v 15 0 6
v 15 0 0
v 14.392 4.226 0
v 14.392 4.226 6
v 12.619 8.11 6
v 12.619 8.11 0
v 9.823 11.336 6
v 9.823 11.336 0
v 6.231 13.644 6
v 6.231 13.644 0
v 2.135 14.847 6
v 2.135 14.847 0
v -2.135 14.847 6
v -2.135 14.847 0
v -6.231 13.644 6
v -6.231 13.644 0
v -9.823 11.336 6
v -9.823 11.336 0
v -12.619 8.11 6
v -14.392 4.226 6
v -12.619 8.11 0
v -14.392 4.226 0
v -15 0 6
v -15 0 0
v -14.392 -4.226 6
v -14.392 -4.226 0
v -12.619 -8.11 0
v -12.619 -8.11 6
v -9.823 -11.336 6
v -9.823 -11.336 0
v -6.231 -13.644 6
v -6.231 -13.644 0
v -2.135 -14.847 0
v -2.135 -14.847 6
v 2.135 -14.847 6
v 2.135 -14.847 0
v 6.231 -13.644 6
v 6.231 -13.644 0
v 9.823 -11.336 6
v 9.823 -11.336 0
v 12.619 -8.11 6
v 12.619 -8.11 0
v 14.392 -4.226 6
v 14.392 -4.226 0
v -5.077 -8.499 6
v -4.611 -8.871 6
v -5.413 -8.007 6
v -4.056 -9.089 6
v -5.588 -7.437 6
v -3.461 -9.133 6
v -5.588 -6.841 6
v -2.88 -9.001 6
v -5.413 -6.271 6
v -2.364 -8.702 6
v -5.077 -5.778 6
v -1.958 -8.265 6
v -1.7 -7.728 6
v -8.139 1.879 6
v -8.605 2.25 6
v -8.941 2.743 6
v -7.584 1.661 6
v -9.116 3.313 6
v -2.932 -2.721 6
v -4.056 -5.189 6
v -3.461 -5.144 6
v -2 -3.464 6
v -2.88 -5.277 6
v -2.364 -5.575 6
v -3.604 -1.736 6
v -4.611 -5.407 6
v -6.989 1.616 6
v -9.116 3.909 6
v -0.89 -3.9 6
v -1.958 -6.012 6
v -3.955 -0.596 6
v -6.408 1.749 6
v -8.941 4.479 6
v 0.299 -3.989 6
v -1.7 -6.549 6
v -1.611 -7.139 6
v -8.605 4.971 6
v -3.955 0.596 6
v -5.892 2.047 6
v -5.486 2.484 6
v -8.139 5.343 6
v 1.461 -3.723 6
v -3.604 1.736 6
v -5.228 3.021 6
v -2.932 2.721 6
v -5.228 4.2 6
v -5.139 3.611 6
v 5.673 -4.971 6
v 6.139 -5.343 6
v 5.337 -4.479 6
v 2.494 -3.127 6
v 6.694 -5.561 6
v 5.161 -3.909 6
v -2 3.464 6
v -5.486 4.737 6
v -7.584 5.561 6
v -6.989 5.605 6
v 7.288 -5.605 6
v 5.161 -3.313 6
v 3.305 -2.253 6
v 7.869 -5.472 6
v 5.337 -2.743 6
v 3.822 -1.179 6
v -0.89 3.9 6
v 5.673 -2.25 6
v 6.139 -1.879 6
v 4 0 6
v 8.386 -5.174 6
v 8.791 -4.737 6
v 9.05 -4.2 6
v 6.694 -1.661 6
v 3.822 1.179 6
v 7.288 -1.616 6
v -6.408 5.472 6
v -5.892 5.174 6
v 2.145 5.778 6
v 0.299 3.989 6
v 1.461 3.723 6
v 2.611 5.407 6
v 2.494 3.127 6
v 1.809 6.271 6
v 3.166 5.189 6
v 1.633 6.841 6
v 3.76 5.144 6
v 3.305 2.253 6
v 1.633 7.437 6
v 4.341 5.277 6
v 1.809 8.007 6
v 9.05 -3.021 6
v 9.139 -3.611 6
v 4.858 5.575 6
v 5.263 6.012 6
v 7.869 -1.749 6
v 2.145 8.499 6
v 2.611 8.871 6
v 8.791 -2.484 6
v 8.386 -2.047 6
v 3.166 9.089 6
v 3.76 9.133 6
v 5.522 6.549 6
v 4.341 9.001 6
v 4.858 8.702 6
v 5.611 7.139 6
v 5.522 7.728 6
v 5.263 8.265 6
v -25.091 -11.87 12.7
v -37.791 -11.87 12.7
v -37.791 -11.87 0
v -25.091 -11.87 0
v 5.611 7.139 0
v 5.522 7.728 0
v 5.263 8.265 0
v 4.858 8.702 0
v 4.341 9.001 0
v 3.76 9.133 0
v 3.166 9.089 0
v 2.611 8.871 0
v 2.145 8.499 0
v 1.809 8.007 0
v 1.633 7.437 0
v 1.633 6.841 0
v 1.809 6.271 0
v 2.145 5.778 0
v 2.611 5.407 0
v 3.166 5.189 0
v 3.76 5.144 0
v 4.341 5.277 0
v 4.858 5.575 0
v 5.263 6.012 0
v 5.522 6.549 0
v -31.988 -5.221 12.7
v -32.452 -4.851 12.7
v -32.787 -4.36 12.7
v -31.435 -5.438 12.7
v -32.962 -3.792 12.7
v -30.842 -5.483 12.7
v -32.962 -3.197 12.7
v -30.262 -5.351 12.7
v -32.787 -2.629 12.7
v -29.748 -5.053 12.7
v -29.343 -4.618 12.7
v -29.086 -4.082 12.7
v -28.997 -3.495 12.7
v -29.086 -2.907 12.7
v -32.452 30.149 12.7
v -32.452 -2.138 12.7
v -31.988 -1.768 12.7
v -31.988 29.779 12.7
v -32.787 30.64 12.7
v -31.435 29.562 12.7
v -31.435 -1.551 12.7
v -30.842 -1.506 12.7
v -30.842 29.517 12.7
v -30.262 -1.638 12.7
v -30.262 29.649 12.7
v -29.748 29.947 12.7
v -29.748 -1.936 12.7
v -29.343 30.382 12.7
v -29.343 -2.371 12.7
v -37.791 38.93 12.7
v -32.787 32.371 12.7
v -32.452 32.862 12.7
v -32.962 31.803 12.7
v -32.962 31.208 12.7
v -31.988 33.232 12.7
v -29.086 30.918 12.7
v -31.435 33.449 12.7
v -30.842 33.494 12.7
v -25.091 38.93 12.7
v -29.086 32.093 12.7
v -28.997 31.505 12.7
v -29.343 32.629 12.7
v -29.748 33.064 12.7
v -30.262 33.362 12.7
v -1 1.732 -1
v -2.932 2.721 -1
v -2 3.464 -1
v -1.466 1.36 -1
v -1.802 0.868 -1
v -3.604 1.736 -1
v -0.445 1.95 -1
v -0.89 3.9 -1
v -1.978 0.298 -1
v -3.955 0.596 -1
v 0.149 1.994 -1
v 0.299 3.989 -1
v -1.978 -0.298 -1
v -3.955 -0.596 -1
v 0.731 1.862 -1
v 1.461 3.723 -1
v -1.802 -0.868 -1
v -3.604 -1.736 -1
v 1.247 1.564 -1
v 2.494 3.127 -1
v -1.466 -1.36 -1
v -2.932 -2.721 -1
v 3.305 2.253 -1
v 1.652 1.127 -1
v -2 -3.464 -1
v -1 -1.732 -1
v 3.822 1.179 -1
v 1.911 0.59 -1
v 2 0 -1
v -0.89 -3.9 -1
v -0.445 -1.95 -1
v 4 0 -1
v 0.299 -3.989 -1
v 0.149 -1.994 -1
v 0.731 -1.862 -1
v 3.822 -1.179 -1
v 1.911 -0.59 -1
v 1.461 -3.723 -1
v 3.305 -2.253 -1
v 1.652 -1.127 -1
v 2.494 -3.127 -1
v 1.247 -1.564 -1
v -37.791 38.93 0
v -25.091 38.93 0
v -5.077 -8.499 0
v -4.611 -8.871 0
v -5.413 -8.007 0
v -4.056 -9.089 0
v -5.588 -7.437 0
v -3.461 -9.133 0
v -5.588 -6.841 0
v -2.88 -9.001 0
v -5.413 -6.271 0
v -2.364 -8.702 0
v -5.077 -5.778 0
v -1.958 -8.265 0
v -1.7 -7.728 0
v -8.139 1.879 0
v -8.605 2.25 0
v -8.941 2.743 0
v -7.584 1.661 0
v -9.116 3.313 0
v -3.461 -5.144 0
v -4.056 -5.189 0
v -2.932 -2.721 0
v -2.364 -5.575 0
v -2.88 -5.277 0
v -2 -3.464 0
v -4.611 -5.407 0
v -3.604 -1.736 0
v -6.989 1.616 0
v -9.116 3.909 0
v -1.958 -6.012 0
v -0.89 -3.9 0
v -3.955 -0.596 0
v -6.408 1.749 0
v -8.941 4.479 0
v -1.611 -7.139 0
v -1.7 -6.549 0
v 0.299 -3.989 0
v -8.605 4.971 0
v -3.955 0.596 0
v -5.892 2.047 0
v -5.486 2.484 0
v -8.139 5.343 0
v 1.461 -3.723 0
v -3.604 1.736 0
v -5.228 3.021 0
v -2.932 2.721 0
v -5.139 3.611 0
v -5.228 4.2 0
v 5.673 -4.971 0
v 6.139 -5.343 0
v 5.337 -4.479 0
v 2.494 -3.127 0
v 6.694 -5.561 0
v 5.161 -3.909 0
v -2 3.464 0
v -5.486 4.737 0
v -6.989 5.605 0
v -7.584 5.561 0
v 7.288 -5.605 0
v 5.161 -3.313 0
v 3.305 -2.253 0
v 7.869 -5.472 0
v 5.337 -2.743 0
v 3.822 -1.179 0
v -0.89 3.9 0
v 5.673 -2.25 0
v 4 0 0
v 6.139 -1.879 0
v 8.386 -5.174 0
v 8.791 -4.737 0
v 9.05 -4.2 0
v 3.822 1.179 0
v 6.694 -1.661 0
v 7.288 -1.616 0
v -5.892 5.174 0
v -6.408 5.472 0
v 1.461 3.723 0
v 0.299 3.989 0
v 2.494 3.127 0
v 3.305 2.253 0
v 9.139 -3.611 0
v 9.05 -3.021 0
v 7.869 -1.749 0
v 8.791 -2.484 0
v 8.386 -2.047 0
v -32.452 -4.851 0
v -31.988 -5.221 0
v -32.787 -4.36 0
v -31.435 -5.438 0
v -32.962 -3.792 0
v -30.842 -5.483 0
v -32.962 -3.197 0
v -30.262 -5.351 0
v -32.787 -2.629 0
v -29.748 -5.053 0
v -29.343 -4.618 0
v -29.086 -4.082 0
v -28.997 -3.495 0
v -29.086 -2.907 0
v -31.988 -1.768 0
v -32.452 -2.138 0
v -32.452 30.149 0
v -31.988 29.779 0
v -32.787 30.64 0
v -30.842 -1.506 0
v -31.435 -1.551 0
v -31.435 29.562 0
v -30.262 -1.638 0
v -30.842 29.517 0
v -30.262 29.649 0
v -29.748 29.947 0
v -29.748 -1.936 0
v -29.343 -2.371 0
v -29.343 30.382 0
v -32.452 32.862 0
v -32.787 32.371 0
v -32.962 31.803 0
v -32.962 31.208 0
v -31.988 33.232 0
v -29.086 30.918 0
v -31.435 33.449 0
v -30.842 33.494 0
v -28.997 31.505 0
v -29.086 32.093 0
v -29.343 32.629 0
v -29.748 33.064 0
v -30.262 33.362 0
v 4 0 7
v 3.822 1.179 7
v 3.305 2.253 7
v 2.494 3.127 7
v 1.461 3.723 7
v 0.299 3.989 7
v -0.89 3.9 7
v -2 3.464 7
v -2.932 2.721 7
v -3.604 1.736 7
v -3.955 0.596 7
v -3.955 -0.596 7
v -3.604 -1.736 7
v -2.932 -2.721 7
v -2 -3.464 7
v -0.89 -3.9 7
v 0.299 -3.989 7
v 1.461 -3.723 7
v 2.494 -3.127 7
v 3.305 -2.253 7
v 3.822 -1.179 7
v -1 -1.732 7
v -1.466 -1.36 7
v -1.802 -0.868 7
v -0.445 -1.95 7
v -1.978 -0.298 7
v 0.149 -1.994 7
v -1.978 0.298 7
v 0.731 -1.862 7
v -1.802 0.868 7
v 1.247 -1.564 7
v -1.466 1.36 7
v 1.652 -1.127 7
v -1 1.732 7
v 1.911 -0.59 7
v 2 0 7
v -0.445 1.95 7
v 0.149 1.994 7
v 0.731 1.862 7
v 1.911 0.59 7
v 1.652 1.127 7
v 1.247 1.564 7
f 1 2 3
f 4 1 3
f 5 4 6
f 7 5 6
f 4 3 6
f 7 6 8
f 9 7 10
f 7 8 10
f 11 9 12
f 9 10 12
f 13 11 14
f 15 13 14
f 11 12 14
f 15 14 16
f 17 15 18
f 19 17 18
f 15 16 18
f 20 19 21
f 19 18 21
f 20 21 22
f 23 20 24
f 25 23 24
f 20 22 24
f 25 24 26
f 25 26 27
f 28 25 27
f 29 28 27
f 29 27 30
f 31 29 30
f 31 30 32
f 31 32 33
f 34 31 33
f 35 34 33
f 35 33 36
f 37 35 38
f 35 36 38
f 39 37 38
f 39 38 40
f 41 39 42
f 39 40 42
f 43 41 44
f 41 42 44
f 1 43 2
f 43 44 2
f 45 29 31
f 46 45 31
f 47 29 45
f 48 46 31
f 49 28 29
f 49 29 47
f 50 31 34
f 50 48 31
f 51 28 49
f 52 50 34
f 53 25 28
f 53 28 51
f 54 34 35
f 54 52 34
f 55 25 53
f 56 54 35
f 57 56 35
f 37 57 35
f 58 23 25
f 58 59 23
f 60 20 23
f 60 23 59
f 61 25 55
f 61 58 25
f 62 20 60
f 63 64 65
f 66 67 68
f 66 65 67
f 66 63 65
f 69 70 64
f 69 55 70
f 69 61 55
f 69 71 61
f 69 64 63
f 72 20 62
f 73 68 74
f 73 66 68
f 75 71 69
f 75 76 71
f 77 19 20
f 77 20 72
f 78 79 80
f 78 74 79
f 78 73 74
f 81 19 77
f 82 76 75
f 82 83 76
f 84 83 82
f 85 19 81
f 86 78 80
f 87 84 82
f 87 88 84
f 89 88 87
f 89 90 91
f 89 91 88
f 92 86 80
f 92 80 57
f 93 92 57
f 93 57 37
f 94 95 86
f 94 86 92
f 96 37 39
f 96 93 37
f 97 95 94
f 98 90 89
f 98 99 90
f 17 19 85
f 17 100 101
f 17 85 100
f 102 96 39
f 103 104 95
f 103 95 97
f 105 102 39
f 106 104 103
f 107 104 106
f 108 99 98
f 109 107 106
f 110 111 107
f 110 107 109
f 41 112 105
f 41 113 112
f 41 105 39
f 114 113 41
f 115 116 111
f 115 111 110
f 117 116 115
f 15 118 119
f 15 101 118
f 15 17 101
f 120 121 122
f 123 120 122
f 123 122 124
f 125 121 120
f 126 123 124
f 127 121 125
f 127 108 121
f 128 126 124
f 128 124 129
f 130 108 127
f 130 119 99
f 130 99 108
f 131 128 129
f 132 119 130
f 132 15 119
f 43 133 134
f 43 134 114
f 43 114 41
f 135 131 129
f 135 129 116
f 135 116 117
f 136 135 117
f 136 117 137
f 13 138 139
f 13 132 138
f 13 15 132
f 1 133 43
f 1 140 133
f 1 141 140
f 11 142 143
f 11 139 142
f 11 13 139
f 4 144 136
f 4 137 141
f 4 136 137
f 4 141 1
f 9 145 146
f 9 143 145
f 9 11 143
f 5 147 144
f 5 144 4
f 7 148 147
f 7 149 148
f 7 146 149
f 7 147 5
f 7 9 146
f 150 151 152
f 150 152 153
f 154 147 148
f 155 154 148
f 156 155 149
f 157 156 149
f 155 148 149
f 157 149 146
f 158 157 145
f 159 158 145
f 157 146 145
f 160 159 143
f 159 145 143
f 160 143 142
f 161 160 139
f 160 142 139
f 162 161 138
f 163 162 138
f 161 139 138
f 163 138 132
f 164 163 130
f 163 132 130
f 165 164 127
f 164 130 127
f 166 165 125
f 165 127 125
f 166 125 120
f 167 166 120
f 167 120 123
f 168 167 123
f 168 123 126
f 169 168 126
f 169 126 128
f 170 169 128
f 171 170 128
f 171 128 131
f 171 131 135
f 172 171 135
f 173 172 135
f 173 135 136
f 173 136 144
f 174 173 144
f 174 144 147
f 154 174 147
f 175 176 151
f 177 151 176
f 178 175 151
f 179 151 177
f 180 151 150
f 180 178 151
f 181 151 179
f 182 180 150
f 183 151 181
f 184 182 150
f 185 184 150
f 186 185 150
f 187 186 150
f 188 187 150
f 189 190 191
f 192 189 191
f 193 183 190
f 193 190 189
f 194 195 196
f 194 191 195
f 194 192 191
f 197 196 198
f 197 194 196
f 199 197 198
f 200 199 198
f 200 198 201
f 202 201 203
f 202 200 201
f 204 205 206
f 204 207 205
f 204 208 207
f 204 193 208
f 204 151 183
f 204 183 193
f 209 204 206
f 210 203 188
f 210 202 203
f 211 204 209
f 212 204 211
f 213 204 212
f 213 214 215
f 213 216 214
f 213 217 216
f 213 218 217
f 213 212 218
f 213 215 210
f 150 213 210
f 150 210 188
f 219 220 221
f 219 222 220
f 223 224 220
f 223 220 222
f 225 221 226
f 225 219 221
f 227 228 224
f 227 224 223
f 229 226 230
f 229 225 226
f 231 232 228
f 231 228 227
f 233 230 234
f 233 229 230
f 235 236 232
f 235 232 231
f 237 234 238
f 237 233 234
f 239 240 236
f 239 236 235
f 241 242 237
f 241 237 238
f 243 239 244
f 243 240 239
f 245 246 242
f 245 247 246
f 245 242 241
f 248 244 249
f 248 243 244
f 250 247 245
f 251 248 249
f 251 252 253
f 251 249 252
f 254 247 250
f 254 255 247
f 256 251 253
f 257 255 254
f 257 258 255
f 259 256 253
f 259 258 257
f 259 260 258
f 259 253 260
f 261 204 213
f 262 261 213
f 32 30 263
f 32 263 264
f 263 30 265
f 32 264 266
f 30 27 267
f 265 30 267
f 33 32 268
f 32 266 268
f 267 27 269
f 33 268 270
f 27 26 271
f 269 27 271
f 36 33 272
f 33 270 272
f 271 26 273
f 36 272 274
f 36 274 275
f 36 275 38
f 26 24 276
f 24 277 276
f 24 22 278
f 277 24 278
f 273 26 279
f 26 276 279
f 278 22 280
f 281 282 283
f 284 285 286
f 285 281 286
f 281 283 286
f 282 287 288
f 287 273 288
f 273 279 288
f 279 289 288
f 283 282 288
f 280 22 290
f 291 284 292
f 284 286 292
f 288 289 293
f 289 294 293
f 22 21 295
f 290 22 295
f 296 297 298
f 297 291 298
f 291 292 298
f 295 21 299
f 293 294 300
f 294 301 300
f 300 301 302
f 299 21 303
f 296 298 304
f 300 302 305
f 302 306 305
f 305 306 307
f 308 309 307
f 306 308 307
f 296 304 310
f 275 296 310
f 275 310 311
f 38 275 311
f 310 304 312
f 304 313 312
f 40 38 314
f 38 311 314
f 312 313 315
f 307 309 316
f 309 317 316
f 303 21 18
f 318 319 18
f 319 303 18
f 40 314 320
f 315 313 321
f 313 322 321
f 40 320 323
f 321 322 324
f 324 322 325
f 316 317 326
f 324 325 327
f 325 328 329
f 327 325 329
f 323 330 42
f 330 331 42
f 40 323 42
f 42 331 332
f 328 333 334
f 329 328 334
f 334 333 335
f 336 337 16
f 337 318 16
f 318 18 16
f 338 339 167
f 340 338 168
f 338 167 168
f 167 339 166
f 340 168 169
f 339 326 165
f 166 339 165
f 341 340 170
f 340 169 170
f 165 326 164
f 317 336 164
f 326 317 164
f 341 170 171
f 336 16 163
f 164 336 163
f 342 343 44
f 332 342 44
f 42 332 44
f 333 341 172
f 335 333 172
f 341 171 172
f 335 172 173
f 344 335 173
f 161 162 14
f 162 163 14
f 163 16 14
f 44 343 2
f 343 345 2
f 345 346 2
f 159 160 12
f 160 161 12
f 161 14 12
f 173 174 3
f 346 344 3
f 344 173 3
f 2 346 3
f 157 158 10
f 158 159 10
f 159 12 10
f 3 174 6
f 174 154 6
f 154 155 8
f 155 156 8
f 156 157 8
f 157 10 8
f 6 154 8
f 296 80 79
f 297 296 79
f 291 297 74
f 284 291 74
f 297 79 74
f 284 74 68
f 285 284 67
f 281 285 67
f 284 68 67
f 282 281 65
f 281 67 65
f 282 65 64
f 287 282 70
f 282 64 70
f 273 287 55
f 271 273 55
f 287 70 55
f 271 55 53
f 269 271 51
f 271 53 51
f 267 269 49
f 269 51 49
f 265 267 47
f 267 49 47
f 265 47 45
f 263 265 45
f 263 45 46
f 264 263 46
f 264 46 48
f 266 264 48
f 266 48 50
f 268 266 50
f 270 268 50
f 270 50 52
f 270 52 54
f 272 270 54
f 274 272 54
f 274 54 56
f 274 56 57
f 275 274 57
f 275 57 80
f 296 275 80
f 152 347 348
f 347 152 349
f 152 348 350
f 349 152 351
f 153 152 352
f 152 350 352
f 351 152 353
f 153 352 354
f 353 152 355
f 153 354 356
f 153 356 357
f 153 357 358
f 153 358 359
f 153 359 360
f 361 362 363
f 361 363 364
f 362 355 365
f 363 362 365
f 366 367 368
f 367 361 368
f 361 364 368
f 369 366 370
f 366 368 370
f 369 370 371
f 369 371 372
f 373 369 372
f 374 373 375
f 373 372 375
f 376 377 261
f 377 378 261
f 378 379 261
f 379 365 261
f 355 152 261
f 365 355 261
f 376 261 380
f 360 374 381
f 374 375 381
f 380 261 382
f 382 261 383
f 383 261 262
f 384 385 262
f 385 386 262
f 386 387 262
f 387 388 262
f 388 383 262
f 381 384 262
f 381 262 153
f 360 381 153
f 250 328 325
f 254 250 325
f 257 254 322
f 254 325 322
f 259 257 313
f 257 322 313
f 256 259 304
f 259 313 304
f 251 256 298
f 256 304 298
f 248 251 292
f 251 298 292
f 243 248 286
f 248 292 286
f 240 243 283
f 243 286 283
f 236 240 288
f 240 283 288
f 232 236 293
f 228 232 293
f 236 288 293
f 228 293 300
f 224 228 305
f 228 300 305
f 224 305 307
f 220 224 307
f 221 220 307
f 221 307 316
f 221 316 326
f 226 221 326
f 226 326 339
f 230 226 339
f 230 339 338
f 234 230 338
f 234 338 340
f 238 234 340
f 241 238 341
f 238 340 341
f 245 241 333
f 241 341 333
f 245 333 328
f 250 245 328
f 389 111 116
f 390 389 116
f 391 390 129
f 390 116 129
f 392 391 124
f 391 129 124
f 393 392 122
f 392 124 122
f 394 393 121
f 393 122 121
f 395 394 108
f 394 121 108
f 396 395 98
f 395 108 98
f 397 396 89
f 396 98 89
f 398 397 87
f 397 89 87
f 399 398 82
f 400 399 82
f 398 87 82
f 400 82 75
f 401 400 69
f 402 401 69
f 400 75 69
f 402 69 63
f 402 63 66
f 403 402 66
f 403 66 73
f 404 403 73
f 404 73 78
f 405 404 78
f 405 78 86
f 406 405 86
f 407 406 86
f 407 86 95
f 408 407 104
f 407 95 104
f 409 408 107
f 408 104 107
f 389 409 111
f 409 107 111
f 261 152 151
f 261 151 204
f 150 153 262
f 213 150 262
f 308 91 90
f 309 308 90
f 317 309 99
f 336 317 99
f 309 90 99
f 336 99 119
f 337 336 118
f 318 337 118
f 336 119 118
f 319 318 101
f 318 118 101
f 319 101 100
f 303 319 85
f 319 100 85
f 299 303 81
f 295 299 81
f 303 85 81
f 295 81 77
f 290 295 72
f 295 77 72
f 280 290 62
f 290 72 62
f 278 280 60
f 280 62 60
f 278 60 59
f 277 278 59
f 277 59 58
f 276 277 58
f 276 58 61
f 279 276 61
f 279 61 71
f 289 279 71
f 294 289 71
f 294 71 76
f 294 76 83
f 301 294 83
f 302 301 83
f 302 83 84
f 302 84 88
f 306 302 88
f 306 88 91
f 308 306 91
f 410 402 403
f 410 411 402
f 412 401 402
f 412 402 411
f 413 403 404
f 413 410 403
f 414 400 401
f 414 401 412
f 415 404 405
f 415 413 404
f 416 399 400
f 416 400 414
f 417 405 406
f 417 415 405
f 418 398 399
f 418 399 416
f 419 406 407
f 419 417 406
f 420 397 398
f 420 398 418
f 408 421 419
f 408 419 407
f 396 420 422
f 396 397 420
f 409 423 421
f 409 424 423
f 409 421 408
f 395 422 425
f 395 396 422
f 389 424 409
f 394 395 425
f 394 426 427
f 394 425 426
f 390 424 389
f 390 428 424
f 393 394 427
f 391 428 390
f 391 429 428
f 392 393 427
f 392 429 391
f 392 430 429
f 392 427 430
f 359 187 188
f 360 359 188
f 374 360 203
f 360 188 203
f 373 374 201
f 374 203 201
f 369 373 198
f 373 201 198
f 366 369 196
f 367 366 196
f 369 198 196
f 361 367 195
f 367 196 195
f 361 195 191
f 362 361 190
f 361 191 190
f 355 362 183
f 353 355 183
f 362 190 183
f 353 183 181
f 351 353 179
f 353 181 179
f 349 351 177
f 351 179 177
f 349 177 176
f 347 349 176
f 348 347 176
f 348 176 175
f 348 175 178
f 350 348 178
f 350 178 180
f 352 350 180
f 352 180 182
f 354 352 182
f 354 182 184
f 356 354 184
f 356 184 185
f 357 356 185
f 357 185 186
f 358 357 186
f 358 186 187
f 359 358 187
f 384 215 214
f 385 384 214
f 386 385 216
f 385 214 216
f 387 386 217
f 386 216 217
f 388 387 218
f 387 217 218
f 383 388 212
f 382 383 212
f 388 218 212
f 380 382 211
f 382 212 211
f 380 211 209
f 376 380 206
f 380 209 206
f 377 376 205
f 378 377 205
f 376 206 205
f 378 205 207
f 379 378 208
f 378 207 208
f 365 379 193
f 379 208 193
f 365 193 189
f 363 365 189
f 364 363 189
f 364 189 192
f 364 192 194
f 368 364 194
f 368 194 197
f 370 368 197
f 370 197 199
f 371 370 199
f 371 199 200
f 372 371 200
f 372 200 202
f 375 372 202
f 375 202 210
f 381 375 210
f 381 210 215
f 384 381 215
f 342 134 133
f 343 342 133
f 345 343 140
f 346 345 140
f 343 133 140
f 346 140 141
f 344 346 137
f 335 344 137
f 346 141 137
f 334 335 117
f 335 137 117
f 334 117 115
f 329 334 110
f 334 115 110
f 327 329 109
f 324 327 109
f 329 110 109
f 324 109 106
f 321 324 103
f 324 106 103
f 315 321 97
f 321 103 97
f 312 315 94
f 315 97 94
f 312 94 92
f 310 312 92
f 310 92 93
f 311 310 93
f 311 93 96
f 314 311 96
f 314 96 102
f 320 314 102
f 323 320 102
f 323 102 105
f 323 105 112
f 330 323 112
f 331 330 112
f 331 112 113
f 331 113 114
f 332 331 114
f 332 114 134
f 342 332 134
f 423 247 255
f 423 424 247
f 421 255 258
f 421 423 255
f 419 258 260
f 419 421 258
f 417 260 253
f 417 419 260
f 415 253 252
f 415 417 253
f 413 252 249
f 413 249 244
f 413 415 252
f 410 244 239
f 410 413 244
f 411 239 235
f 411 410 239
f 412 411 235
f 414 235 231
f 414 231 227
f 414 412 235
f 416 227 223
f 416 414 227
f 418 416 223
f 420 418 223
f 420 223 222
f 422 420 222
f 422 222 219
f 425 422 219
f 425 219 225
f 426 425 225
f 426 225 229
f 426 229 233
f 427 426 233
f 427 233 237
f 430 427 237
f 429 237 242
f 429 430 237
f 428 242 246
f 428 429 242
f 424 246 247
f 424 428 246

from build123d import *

# Parameters (mm, degrees)
F0_R      = 15
F1_DEPTH  = 6
F2_R      = 2
F3_DEPTH  = 6.001
F2_R_2    = 4
F4_DEPTH  = 1
F5_R      = 4
F5_R_2    = 2
F6_DEPTH  = 1
F7_W      = 12.7
F7_H      = 50.8
F8_DEPTH  = 12.7
F9_R      = 1.9939
F10_DEPTH = 25.4


with BuildPart() as f1:
    # F0 (on Top) → F1 (new body)
    with BuildSketch(Plane.XY):
        Circle(F0_R)
    extrude(amount=F1_DEPTH)

    # F2 (on face) → F3 (cut, through all)
    with BuildSketch(Plane.XY.offset(6)):
        with Locations((-7.1388032756, 3.6107461546)):
            Circle(F2_R)
        with Locations((3.6107461546, 7.1388032756)):
            Circle(F2_R)
        with Locations((7.1388032756, -3.6107461546)):
            Circle(F2_R)
        with Locations((-3.6107461546, -7.1388032756)):
            Circle(F2_R)
        Circle(F2_R)
    extrude(amount=-F3_DEPTH, mode=Mode.SUBTRACT)

    # F2 (on face) → F4 (join)
    with BuildSketch(Plane.XY.offset(6)):
        Circle(F2_R_2)
        Circle(F2_R, mode=Mode.SUBTRACT)
    extrude(amount=F4_DEPTH)

    # F5 (on face) → F6 (join)
    with BuildSketch(Plane(origin=(0, 0, 0), x_dir=(1, 0, 0), z_dir=(0, 0, -1))):
        Circle(F5_R)
        Circle(F5_R_2, mode=Mode.SUBTRACT)
    extrude(amount=F6_DEPTH)


with BuildPart() as f8:
    # F7 (on Top) → F8 (new body)
    with BuildSketch(Plane.XY):
        with Locations((-31.441340223, 13.5298846505)):
            Rectangle(F7_W, F7_H)
    extrude(amount=F8_DEPTH)

    # F9 (on face) → F10 (cut)
    with BuildSketch(Plane.XY.offset(12.7)):
        with Locations((-30.9908390045, 31.505475532)):
            Circle(F9_R)
        with Locations((-30.9908390045, -3.494524468)):
            Circle(F9_R)
    extrude(amount=-F10_DEPTH, mode=Mode.SUBTRACT)


solid = Compound([f1.part, f8.part])
